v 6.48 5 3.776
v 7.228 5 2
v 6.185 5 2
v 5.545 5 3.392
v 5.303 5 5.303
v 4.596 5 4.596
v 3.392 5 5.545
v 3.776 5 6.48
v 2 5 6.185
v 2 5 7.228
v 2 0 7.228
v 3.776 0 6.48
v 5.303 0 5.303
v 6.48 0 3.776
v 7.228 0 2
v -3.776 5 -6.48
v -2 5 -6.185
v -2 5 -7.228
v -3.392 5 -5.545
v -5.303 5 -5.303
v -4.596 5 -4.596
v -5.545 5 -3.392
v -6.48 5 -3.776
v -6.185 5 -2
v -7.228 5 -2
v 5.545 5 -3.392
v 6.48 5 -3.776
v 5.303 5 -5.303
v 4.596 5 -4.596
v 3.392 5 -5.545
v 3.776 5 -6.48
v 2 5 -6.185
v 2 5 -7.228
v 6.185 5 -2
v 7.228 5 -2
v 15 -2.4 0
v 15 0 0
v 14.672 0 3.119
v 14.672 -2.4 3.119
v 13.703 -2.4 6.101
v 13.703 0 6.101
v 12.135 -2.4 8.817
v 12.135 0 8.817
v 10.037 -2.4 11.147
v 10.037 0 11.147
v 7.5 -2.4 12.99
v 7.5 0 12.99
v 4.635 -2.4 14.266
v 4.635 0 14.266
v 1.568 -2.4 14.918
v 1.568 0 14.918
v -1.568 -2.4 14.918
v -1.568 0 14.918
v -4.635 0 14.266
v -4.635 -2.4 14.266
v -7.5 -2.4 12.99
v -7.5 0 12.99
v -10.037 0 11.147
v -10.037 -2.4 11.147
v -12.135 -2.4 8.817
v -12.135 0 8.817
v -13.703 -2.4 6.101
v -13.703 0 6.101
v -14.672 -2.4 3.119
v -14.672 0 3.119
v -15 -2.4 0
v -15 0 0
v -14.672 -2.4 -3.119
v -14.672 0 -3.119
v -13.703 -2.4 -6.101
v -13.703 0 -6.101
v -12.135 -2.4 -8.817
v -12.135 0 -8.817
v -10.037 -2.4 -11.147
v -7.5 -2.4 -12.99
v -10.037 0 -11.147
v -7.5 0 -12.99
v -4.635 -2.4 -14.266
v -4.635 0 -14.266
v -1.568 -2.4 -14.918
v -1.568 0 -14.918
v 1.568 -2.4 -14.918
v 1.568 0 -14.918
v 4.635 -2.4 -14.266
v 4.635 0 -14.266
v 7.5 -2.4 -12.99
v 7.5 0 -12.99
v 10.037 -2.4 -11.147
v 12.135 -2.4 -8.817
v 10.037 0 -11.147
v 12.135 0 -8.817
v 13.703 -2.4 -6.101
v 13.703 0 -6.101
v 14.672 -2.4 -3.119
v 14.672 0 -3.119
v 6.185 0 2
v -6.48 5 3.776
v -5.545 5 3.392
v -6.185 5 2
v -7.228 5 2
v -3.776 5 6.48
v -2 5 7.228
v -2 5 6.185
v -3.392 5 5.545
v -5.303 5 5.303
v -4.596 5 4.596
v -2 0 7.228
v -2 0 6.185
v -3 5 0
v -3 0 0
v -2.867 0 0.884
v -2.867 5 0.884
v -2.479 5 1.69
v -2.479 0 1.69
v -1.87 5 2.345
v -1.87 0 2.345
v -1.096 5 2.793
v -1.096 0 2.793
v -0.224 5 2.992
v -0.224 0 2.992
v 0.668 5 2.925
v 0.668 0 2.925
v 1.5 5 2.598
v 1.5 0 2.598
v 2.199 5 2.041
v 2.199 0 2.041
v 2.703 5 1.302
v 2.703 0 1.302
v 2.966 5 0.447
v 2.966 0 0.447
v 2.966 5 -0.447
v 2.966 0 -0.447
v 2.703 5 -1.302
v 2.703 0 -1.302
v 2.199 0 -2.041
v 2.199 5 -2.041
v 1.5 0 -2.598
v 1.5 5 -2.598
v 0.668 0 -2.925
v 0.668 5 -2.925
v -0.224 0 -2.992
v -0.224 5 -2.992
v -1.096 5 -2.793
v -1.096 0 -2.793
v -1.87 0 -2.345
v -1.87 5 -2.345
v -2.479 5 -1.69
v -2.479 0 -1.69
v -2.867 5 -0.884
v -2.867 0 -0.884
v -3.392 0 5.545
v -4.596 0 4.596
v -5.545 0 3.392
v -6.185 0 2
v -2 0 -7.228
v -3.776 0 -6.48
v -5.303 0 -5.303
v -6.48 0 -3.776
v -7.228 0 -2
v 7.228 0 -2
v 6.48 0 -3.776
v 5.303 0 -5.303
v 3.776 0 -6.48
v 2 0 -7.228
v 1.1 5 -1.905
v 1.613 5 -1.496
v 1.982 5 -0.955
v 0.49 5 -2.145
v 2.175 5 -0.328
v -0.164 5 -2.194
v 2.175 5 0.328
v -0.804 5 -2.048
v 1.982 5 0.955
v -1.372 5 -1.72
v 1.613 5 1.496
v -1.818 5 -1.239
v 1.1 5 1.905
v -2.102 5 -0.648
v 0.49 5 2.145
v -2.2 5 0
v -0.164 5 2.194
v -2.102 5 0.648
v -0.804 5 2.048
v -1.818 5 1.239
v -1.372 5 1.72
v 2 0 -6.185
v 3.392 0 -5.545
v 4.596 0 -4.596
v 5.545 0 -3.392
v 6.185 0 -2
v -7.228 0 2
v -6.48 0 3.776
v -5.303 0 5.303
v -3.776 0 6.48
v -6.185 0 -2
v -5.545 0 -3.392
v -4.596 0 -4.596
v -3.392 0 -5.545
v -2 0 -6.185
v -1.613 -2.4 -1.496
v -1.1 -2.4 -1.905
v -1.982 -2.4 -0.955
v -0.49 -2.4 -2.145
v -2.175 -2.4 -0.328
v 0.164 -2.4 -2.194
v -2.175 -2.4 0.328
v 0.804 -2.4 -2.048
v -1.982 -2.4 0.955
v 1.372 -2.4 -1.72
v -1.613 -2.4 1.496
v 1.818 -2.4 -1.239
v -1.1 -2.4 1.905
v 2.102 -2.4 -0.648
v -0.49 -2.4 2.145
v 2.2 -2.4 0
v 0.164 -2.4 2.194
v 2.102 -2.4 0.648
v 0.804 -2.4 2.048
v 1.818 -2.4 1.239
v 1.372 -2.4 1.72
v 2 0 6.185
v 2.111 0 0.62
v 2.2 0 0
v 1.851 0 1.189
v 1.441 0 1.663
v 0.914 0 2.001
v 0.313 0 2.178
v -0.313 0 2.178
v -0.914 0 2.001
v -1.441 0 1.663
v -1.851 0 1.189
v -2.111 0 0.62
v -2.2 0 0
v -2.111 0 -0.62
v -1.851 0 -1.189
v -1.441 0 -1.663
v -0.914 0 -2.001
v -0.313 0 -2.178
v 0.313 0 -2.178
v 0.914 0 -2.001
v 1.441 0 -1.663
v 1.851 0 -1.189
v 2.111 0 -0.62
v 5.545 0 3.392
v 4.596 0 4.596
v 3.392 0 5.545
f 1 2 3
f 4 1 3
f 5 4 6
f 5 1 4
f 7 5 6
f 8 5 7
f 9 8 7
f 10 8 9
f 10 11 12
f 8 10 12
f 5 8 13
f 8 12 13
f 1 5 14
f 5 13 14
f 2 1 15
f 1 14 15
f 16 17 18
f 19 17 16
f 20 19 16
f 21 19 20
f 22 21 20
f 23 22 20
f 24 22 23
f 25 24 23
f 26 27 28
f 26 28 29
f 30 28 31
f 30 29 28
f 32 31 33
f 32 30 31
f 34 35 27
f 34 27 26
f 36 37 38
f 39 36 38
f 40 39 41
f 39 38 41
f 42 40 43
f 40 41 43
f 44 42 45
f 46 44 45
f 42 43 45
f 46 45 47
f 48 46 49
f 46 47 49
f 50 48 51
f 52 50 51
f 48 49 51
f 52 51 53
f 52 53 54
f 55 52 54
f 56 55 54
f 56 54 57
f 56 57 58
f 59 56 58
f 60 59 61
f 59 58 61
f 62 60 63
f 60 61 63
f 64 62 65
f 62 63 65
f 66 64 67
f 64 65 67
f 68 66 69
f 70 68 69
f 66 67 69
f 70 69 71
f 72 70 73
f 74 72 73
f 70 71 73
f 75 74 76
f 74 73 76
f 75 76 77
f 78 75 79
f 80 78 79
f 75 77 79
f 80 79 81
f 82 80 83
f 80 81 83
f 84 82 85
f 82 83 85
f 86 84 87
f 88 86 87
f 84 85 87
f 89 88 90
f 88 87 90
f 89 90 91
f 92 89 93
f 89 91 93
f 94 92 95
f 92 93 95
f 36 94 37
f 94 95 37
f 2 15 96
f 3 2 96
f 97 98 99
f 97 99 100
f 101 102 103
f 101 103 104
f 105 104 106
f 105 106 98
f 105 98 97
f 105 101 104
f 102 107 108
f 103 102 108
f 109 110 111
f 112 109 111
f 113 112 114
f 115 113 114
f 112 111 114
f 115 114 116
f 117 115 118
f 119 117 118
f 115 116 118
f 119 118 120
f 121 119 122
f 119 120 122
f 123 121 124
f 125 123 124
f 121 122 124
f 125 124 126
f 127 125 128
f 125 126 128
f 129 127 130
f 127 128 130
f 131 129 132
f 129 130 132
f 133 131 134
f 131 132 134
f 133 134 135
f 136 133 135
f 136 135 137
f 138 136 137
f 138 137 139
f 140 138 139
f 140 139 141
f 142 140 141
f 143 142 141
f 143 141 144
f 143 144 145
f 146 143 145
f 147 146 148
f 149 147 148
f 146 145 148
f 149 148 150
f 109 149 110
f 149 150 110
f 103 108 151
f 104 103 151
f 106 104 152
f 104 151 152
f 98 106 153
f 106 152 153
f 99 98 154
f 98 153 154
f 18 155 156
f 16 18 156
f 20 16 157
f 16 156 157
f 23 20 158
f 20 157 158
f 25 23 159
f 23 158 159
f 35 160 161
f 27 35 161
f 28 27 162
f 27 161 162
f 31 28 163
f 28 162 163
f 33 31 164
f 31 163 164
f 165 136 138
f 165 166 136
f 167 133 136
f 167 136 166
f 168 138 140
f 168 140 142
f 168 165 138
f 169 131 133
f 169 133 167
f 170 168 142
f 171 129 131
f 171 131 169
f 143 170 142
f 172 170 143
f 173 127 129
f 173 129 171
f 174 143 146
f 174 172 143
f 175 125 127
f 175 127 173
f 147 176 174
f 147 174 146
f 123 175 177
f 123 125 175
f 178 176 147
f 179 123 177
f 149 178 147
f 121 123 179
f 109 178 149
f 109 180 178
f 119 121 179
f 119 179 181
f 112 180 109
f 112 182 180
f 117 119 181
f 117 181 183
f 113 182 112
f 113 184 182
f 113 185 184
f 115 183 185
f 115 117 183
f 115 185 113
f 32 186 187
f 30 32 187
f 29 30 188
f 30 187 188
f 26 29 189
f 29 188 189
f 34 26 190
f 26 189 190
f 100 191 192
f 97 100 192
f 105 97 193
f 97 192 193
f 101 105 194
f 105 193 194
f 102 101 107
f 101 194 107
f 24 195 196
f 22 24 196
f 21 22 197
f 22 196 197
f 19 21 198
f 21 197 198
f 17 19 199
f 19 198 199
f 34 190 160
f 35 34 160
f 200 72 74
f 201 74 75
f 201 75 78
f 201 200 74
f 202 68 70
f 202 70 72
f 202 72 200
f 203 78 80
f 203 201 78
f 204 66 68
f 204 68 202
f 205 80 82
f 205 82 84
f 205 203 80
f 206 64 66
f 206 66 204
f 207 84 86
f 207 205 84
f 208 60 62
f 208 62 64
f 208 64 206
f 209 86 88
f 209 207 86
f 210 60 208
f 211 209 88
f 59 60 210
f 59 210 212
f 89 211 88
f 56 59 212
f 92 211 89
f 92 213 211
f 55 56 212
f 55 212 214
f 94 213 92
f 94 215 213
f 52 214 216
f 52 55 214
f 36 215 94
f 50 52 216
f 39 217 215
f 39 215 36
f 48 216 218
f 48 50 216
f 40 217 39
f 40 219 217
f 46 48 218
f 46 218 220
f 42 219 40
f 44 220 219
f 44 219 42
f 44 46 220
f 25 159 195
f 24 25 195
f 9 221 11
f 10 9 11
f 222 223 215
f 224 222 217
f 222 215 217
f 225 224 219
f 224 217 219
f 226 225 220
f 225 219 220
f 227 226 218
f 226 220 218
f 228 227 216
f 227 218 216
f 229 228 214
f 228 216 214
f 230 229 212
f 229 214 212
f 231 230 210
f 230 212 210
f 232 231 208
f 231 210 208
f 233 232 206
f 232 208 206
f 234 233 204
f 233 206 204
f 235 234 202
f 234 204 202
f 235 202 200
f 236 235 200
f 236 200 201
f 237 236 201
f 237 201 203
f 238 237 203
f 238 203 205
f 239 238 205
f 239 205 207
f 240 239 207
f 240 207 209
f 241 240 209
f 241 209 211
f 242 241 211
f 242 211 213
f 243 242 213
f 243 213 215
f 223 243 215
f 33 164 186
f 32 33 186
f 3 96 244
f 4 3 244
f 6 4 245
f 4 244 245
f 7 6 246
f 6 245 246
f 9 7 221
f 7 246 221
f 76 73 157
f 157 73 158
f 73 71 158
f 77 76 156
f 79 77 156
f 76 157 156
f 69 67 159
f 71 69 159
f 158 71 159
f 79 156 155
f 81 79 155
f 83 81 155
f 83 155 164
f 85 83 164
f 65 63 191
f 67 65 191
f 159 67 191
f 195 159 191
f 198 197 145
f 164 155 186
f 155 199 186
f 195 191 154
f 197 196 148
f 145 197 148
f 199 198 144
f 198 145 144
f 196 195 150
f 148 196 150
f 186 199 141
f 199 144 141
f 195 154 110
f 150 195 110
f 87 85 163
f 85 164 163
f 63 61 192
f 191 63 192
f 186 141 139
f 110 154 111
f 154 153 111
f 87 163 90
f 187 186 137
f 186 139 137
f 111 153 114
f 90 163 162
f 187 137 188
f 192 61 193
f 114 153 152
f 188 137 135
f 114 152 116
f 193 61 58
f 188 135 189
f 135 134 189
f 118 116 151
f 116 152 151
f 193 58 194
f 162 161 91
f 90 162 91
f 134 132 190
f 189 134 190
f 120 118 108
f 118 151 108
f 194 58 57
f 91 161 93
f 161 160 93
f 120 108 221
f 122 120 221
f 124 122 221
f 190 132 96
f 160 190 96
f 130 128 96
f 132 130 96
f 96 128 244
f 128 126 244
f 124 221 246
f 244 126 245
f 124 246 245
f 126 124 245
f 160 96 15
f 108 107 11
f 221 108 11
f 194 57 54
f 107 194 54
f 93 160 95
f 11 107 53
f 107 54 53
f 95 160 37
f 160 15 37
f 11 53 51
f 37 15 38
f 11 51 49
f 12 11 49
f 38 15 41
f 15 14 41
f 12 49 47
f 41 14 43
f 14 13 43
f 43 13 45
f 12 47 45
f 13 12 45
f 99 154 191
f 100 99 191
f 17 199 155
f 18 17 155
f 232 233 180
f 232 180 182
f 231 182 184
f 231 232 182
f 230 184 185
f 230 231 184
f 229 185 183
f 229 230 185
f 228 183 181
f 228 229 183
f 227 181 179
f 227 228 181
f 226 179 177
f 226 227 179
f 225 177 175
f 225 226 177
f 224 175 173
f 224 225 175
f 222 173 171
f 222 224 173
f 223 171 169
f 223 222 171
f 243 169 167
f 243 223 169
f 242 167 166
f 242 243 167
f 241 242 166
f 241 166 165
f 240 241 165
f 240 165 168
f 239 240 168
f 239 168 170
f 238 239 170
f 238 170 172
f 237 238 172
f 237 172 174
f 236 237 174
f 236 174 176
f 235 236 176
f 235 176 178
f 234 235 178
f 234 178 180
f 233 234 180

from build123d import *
from build123d import SkipClean  # not in build123d's __all__

# Parameters (mm, degrees)
F0_R     = 15
F1_DEPTH = 2.4
F2_R     = 2.2
F3_DEPTH = 2.401
F4_R     = 3
F4_R_2   = 2.2
F5_DEPTH = 5


with BuildPart() as f1:
    # F0 (on Front) → F1 (new body)
    with BuildSketch(Plane.XZ):
        Circle(F0_R)
    extrude(amount=F1_DEPTH)

    # F2 (on face) → F3 (cut, through all)
    with BuildSketch(Plane.XZ.offset(2.4)):
        Circle(F2_R)
    extrude(amount=-F3_DEPTH, mode=Mode.SUBTRACT)

    # F4 (on face) → F5 (join)
    with BuildSketch(Plane(origin=(0, 0, 0), x_dir=(-1, 0, 0), z_dir=(0, 1, 0))):
        Circle(F4_R)
        Circle(F4_R_2, mode=Mode.SUBTRACT)
        with BuildLine():
            ThreePointArc((-2, 7.2284161474), (-5.3033008589, 5.3033008589), (-7.2284161474, 2))
            Line((-7.2284161474, 2), (-6.1846584384, 2))
            ThreePointArc((-6.1846584384, 2), (-4.5961940777, 4.5961940777), (-2, 6.1846584384))
            Line((-2, 6.1846584384), (-2, 7.2284161474))
        make_face()
        with BuildLine():
            Line((-2, -7.2284161474), (-2, -6.1846584384))
            ThreePointArc((-2, -6.1846584384), (-4.5961940777, -4.5961940777), (-6.1846584384, -2))
            Line((-6.1846584384, -2), (-7.2284161474, -2))
            ThreePointArc((-7.2284161474, -2), (-5.3033008589, -5.3033008589), (-2, -7.2284161474))
        make_face()
        with BuildLine():
            Line((2, 7.2284161474), (2, 6.1846584384))
            ThreePointArc((2, 6.1846584384), (4.5961940777, 4.5961940777), (6.1846584384, 2))
            Line((6.1846584384, 2), (7.2284161474, 2))
            ThreePointArc((7.2284161474, 2), (5.3033008589, 5.3033008589), (2, 7.2284161474))
        make_face()
        with BuildLine():
            ThreePointArc((6.1846584384, -2), (4.5961940777, -4.5961940777), (2, -6.1846584384))
            Line((2, -6.1846584384), (2, -7.2284161474))
            ThreePointArc((2, -7.2284161474), (5.3033008589, -5.3033008589), (7.2284161474, -2))
            Line((7.2284161474, -2), (6.1846584384, -2))
        make_face()
    with SkipClean():  # cleaning this boolean's faces spoils the solid; the shape is the same uncleaned
        extrude(amount=F5_DEPTH)


solid = f1.part
